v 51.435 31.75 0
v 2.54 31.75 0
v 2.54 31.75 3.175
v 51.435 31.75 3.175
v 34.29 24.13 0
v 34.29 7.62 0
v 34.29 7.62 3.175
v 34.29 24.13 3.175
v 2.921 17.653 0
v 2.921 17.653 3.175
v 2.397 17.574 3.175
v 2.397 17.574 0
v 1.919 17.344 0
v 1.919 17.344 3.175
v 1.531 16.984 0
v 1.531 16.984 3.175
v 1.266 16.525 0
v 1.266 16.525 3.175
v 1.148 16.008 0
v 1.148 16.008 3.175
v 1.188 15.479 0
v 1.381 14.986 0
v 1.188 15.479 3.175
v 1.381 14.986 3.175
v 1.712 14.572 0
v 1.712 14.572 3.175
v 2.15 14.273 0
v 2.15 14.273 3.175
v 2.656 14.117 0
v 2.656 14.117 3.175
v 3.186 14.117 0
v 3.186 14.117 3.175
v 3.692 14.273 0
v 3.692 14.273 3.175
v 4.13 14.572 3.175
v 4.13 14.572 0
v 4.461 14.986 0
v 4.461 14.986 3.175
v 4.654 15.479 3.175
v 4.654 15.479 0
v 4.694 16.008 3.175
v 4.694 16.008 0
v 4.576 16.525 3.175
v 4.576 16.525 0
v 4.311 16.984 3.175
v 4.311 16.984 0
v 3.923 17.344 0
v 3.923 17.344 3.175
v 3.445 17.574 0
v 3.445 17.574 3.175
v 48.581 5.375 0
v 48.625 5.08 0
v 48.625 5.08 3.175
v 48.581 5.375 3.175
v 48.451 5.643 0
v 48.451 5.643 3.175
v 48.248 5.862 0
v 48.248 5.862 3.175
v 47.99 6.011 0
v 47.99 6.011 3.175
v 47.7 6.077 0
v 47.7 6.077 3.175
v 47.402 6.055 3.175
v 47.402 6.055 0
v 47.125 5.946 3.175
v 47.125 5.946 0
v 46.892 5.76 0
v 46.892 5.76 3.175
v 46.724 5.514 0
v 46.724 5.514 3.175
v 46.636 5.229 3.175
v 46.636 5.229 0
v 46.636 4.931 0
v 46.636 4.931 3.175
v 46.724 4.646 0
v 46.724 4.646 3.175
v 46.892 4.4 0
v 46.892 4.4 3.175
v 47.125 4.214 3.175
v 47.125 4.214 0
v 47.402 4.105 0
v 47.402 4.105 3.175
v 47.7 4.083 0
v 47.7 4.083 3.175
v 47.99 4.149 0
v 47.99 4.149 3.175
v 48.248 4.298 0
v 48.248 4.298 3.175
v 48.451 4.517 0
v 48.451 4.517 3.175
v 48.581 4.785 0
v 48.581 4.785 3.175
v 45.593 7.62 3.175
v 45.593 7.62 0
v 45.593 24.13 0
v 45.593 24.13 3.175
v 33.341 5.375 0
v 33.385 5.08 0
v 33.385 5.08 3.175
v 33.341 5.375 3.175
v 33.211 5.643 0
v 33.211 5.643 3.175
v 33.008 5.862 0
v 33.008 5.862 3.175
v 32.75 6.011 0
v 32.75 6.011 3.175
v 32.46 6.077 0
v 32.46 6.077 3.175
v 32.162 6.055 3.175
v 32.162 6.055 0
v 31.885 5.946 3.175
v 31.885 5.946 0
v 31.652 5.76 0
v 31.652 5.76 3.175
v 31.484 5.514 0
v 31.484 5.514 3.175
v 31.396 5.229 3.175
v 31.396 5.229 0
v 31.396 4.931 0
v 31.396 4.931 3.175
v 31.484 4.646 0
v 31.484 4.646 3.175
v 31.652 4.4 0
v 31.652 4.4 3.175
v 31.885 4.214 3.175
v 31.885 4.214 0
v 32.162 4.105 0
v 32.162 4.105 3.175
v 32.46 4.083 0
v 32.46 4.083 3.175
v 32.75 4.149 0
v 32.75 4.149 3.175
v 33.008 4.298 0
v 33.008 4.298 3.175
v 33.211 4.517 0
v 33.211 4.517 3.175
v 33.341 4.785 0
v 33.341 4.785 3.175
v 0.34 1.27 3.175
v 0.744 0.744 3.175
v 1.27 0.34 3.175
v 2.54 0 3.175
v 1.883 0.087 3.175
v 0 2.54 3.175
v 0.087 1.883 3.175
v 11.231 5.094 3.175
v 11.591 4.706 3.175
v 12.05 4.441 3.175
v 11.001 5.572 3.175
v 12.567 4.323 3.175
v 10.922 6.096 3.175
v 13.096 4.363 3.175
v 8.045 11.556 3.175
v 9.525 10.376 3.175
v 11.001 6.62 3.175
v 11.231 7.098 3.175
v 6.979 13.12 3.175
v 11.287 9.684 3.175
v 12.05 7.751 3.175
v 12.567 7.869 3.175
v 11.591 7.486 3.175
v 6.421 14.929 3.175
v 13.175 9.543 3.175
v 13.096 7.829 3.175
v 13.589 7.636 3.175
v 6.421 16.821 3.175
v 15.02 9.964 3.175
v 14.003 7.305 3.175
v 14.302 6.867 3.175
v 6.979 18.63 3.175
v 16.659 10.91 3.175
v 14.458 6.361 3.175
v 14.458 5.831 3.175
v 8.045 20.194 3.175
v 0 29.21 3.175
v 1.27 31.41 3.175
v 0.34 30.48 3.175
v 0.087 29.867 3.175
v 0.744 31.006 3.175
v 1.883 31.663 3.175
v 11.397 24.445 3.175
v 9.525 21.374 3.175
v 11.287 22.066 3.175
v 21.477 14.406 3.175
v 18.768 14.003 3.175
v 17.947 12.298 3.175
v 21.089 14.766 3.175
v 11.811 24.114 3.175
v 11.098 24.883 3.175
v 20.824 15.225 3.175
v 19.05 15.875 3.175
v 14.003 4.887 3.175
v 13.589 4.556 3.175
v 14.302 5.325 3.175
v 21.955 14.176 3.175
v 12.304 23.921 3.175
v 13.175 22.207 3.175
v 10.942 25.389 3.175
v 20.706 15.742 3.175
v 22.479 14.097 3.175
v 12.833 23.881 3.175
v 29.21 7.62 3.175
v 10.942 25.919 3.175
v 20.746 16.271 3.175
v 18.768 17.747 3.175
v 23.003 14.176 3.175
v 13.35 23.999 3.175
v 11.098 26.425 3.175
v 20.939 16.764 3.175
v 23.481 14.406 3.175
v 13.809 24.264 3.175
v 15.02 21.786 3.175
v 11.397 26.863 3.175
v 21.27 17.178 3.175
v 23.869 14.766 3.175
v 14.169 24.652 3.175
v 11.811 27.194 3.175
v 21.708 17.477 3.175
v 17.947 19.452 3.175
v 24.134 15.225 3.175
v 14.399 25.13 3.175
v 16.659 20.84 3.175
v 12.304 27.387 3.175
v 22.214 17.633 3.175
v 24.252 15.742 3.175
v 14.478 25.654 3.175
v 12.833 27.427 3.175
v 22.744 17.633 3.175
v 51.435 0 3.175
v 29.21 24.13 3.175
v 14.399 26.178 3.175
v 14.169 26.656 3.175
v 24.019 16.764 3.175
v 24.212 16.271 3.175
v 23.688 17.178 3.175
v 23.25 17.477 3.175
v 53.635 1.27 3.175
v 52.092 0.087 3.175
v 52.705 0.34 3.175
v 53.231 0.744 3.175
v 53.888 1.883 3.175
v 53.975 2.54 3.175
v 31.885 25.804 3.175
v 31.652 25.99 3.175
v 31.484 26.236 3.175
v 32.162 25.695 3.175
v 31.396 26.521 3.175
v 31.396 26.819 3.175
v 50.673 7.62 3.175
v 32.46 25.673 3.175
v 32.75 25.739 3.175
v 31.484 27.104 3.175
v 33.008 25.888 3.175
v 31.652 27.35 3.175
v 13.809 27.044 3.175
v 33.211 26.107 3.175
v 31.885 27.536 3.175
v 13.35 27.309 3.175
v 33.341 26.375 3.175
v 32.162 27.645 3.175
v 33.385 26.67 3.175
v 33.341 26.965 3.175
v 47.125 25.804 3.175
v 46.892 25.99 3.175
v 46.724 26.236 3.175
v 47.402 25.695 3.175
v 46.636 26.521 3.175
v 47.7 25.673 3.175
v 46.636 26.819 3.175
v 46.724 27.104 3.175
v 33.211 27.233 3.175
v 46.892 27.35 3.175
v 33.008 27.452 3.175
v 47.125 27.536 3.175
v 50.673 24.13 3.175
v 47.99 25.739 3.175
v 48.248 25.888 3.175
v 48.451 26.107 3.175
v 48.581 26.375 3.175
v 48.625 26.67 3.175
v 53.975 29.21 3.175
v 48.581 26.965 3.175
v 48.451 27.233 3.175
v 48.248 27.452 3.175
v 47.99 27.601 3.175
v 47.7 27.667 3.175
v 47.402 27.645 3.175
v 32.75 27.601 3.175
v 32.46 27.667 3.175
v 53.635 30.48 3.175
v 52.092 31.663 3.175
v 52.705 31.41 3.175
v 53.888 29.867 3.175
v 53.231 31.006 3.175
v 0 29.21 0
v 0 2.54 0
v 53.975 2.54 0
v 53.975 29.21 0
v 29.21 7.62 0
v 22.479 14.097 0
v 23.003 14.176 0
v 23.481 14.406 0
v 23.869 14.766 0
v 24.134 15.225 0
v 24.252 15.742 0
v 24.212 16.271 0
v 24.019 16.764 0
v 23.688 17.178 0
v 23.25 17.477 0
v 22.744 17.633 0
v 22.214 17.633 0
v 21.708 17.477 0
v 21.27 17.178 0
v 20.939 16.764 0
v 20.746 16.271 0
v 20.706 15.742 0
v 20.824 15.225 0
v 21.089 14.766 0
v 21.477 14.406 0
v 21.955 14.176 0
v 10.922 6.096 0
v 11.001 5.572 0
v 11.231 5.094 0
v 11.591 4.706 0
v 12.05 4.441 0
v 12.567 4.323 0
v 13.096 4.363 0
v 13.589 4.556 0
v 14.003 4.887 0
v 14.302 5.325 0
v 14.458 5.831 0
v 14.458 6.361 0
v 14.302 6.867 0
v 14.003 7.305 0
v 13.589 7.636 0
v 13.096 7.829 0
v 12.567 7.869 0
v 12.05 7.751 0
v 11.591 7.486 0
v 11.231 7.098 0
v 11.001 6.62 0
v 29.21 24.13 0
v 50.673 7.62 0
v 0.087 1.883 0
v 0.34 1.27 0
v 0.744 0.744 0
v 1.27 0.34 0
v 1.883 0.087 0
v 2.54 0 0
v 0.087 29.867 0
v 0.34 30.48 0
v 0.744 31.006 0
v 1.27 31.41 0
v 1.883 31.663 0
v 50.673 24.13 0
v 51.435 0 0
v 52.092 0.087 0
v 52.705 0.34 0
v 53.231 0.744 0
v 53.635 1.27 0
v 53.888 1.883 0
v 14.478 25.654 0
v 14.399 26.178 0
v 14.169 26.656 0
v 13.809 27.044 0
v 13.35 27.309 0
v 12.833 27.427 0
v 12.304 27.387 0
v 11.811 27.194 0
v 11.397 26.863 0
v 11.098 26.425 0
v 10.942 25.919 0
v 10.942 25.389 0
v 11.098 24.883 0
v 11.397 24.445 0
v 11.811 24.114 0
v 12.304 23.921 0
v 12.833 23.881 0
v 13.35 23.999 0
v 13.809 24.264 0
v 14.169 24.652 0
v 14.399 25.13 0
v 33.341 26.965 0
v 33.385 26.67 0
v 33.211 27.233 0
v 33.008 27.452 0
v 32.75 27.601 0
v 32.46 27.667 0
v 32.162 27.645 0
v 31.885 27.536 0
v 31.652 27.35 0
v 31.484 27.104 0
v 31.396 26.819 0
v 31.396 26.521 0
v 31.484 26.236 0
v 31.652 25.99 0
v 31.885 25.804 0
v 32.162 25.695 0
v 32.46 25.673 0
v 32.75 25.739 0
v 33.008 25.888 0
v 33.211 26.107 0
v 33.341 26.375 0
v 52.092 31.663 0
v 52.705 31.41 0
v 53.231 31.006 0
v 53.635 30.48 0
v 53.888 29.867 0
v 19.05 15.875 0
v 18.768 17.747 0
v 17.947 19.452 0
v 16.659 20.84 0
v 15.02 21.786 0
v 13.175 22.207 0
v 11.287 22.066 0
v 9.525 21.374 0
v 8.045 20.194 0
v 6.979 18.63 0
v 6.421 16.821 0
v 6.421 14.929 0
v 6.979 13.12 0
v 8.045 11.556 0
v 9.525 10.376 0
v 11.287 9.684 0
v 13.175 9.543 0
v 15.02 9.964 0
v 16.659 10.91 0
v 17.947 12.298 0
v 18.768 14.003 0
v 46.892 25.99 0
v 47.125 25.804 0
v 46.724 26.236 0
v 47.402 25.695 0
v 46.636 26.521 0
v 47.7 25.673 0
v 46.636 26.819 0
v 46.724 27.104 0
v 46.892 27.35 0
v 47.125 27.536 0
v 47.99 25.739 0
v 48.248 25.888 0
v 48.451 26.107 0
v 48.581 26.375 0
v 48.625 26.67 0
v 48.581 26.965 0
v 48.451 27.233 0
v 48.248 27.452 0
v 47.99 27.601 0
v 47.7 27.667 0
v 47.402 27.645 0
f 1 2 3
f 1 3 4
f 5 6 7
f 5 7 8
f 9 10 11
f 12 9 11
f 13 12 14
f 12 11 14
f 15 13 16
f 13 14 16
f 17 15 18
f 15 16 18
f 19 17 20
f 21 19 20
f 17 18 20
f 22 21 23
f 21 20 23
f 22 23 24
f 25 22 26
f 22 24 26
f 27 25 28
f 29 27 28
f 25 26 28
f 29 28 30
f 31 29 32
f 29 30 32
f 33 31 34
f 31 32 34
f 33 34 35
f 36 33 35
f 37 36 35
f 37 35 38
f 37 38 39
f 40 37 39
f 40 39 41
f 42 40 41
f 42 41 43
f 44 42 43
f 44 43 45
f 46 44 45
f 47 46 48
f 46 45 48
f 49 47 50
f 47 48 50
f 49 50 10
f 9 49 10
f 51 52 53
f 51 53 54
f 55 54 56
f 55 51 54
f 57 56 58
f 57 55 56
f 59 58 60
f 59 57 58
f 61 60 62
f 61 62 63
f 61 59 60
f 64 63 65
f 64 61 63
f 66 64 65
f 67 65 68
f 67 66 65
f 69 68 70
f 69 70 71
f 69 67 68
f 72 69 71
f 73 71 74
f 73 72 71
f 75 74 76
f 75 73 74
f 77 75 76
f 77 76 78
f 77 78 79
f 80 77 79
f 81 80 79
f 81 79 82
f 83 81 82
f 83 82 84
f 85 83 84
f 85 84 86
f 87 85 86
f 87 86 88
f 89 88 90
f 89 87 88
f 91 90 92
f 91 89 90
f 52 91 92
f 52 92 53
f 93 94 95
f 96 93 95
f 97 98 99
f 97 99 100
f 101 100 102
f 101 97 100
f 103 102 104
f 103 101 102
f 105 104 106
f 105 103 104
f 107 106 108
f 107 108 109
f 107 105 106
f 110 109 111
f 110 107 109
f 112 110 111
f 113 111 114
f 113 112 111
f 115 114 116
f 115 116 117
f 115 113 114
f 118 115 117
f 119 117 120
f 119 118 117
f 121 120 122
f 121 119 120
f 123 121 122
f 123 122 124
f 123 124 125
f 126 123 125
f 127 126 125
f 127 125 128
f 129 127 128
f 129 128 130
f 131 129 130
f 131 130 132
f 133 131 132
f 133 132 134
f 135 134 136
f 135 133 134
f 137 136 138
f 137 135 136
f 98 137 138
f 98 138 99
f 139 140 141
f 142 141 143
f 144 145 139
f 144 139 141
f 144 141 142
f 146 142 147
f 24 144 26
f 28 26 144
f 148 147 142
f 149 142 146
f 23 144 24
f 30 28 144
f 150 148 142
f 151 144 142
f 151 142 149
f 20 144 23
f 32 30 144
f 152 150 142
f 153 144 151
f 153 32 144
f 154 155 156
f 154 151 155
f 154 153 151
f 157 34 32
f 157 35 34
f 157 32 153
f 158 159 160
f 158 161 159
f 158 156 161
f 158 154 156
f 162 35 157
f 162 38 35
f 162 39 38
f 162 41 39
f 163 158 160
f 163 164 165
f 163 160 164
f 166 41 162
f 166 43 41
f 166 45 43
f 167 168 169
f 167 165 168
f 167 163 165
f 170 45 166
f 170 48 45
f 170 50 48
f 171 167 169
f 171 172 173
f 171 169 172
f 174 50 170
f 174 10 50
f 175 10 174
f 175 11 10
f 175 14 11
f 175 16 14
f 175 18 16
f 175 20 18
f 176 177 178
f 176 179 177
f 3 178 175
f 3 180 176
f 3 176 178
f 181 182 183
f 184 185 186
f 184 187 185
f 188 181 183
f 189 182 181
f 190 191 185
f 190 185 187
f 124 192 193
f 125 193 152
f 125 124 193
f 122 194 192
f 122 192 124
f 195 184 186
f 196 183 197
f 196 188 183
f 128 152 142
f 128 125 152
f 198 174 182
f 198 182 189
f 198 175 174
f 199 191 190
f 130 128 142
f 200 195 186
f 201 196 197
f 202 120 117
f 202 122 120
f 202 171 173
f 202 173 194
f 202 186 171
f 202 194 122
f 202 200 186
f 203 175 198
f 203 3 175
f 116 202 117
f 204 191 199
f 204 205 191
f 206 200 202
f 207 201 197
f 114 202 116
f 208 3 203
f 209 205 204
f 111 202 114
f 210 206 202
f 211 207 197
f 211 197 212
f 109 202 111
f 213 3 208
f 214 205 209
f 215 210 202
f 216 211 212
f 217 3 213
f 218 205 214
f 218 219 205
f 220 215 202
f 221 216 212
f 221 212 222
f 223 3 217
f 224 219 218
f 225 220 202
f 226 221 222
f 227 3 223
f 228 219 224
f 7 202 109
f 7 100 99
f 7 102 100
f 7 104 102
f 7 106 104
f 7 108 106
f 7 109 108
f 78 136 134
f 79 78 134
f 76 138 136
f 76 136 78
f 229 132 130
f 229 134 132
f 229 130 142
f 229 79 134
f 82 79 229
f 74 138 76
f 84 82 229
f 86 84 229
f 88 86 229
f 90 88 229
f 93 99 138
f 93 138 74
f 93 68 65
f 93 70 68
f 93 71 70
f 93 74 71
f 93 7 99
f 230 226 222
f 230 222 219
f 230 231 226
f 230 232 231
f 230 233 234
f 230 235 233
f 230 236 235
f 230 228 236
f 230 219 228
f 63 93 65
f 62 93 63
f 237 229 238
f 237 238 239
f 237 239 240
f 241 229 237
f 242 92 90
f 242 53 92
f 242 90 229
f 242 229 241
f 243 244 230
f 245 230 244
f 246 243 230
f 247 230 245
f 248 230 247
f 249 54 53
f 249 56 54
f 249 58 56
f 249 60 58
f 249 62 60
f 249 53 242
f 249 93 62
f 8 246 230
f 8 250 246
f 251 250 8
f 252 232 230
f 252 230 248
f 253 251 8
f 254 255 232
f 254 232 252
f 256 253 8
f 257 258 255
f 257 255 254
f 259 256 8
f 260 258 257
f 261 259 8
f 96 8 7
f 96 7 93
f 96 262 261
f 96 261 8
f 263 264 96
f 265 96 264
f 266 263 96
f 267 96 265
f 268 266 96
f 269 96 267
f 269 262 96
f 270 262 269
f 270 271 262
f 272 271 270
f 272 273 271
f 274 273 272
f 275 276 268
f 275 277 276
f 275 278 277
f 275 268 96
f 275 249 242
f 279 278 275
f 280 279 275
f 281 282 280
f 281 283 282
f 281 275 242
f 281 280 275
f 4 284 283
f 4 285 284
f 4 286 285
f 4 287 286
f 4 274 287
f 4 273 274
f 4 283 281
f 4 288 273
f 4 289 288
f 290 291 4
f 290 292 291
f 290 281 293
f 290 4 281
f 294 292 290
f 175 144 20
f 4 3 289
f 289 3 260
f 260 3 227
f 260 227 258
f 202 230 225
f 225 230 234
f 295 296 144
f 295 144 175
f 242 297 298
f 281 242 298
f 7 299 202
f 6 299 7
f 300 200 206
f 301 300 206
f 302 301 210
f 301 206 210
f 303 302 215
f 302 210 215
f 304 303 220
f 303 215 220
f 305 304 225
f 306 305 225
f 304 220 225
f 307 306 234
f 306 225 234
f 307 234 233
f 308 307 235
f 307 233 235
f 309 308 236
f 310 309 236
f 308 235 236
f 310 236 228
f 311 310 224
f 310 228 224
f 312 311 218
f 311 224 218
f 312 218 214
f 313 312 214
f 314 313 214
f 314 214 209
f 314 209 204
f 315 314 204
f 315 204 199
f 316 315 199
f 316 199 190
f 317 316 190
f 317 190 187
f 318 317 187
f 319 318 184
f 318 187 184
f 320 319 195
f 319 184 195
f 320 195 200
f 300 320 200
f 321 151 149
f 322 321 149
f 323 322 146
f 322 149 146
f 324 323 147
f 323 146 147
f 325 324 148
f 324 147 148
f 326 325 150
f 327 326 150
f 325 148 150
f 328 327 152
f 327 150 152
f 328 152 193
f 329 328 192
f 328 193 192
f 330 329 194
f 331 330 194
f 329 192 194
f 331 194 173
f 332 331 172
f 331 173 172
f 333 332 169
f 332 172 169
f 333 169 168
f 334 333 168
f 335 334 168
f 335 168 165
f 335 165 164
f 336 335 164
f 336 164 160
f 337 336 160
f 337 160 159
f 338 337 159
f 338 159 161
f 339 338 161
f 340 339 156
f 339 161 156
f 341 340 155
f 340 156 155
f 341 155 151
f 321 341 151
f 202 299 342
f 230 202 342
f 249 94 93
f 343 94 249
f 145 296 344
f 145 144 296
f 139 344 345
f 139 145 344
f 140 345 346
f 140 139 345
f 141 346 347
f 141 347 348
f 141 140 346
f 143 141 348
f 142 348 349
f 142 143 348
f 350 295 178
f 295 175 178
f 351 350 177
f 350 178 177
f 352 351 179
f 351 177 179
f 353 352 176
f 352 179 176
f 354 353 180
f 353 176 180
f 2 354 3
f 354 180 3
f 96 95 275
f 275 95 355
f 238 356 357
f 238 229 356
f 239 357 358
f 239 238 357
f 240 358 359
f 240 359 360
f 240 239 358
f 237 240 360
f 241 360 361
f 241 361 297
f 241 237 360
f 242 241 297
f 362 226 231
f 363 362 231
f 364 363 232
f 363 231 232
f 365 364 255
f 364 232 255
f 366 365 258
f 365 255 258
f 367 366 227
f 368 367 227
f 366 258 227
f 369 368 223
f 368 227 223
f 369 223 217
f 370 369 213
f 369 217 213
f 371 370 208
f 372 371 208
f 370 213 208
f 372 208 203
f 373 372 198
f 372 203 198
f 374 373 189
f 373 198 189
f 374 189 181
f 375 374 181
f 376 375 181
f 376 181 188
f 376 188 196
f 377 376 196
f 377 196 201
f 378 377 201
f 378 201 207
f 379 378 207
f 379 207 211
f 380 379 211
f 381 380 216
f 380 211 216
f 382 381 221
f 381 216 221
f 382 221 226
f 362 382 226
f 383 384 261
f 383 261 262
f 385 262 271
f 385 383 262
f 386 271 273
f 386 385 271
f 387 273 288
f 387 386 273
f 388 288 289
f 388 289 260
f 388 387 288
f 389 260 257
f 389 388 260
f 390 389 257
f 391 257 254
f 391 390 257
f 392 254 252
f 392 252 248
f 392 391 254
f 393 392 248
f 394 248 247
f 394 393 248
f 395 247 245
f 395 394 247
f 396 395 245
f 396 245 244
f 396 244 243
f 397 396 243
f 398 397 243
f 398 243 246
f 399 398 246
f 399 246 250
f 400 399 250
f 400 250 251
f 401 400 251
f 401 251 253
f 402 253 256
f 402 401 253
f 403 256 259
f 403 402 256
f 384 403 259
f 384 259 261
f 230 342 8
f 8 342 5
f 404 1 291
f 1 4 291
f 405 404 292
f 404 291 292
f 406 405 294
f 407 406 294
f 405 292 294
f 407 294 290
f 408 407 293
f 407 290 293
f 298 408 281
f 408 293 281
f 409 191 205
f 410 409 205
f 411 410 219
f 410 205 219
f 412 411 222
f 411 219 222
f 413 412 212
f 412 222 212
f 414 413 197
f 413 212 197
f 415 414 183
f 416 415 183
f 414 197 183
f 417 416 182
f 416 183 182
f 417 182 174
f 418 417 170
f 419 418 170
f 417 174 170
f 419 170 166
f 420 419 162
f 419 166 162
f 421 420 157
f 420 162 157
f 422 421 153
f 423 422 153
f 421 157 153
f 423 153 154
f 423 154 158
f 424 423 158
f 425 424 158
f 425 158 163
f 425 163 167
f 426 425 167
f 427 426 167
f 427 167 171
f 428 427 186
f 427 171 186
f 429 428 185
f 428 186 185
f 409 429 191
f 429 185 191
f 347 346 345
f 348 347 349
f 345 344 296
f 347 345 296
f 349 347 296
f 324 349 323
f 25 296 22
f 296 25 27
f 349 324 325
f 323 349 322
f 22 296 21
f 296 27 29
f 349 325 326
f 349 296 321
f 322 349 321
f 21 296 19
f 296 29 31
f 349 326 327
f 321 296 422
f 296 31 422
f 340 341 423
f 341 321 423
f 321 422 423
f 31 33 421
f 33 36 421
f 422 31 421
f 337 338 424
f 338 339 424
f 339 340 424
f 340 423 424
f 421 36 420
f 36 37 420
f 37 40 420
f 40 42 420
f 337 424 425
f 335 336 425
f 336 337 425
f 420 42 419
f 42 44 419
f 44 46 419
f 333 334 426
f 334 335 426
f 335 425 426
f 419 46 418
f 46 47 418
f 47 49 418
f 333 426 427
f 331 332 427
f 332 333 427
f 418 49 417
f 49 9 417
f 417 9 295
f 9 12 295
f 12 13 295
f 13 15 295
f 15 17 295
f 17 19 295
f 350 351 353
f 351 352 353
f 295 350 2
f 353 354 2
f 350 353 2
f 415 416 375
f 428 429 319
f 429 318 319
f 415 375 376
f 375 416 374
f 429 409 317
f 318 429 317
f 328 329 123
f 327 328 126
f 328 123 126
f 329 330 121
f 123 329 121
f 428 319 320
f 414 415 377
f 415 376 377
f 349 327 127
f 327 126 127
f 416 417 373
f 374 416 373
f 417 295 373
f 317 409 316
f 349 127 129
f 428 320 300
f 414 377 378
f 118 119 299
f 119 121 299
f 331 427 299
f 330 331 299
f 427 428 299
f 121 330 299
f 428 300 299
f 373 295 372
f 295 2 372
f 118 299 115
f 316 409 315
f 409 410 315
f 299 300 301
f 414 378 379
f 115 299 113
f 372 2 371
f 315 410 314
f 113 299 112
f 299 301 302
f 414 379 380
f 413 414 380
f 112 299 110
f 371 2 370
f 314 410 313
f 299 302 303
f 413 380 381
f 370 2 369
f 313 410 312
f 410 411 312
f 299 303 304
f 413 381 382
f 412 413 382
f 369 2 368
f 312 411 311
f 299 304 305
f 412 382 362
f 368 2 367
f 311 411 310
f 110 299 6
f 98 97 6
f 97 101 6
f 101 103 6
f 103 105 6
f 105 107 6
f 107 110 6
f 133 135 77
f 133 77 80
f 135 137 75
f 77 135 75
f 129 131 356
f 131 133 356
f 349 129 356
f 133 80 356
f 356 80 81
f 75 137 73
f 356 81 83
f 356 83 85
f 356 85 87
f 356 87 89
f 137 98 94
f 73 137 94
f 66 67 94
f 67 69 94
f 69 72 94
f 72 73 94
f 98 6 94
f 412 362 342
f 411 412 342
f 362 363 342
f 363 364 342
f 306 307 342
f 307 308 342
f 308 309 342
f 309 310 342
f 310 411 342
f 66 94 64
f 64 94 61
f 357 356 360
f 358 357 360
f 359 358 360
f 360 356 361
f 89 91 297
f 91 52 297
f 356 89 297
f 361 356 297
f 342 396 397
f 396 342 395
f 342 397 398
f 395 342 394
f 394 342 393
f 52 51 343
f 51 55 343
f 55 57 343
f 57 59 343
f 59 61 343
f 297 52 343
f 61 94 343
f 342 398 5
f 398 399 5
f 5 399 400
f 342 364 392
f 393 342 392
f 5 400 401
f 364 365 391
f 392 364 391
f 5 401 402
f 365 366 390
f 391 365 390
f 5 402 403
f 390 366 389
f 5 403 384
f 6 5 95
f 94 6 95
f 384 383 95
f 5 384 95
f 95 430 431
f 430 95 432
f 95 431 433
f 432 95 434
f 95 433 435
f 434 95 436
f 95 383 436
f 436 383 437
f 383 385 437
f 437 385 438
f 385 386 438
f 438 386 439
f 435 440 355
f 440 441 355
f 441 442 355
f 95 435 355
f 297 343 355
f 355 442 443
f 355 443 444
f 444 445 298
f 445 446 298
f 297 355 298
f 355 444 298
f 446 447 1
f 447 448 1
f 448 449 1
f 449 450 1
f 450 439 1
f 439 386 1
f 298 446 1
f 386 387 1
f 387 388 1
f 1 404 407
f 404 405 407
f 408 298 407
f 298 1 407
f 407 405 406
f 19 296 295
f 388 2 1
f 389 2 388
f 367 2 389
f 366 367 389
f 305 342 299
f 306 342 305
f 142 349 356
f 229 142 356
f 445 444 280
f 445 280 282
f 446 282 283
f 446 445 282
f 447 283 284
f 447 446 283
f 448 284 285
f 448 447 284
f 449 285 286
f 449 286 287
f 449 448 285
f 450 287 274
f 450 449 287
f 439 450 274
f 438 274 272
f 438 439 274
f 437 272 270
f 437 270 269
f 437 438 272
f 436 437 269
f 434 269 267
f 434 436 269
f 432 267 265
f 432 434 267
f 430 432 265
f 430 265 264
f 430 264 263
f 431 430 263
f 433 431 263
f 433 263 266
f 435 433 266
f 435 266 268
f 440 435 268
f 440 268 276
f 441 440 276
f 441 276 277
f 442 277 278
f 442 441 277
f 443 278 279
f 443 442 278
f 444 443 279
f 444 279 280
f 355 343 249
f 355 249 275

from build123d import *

# Parameters (mm, degrees)
SKETCH2_W           = 53.975
SKETCH2_H           = 31.75
SKETCH2_R           = 1
SKETCH2_W_2         = 5.08
SKETCH2_H_2         = 16.51
BOSS_EXTRUDE1_DEPTH = 3.175
SKETCH3_R           = 6.35
CUT_EXTRUDE1_DEPTH  = 3.175
SKETCH4_R           = 1.778
CUT_EXTRUDE2_DEPTH  = 3.175
CIRPATTERN1_COUNT   = 4
FILLET1_R           = 2.54


with BuildPart() as part:
    # Sketch2 → Boss-Extrude1 (new body)
    with BuildSketch(Plane.XY):
        with Locations((26.9875, 15.875)):
            Rectangle(SKETCH2_W, SKETCH2_H)
        with Locations((32.385, 26.67)):
            Circle(SKETCH2_R, mode=Mode.SUBTRACT)
        with Locations((47.625, 26.67)):
            Circle(SKETCH2_R, mode=Mode.SUBTRACT)
        with Locations((32.385, 5.08)):
            Circle(SKETCH2_R, mode=Mode.SUBTRACT)
        with Locations((47.625, 5.08)):
            Circle(SKETCH2_R, mode=Mode.SUBTRACT)
        with Locations((31.75, 15.875)):
            Rectangle(SKETCH2_W_2, SKETCH2_H_2, mode=Mode.SUBTRACT)
        with Locations((48.133, 15.875)):
            Rectangle(SKETCH2_W_2, SKETCH2_H_2, mode=Mode.SUBTRACT)
    extrude(amount=BOSS_EXTRUDE1_DEPTH)

    # Sketch3 → Cut-Extrude1 (cut)
    with BuildSketch(Plane.XY.offset(3.175)):
        with Locations((12.7, 15.875)):
            Circle(SKETCH3_R)
    extrude(amount=-CUT_EXTRUDE1_DEPTH, mode=Mode.SUBTRACT)

    # Sketch4 → Cut-Extrude2 (cut)
    with BuildSketch(Plane.XY.offset(3.175)):
        with Locations((12.7, 25.654)):
            Circle(SKETCH4_R)
    cut_extrude2 = extrude(amount=-CUT_EXTRUDE2_DEPTH, mode=Mode.SUBTRACT)

    # CirPattern1: Cut-Extrude2 ×4 about axis
    cirpattern1_axis = Axis((12.7, 15.875, 0), (0, 0, 1))
    for i in range(1, CIRPATTERN1_COUNT):
        add(cut_extrude2.rotate(cirpattern1_axis, i * 360 / CIRPATTERN1_COUNT), mode=Mode.SUBTRACT)

    # Fillet1
    fillet1_edges = [part.edges().sort_by_distance(p)[0] for p in [
        (0, 31.75, 1.5875),
        (53.975, 31.75, 1.5875),
        (53.975, 0, 1.5875),
        (0, 0, 1.5875),
    ]]
    fillet(fillet1_edges, radius=FILLET1_R)


solid = part.part
